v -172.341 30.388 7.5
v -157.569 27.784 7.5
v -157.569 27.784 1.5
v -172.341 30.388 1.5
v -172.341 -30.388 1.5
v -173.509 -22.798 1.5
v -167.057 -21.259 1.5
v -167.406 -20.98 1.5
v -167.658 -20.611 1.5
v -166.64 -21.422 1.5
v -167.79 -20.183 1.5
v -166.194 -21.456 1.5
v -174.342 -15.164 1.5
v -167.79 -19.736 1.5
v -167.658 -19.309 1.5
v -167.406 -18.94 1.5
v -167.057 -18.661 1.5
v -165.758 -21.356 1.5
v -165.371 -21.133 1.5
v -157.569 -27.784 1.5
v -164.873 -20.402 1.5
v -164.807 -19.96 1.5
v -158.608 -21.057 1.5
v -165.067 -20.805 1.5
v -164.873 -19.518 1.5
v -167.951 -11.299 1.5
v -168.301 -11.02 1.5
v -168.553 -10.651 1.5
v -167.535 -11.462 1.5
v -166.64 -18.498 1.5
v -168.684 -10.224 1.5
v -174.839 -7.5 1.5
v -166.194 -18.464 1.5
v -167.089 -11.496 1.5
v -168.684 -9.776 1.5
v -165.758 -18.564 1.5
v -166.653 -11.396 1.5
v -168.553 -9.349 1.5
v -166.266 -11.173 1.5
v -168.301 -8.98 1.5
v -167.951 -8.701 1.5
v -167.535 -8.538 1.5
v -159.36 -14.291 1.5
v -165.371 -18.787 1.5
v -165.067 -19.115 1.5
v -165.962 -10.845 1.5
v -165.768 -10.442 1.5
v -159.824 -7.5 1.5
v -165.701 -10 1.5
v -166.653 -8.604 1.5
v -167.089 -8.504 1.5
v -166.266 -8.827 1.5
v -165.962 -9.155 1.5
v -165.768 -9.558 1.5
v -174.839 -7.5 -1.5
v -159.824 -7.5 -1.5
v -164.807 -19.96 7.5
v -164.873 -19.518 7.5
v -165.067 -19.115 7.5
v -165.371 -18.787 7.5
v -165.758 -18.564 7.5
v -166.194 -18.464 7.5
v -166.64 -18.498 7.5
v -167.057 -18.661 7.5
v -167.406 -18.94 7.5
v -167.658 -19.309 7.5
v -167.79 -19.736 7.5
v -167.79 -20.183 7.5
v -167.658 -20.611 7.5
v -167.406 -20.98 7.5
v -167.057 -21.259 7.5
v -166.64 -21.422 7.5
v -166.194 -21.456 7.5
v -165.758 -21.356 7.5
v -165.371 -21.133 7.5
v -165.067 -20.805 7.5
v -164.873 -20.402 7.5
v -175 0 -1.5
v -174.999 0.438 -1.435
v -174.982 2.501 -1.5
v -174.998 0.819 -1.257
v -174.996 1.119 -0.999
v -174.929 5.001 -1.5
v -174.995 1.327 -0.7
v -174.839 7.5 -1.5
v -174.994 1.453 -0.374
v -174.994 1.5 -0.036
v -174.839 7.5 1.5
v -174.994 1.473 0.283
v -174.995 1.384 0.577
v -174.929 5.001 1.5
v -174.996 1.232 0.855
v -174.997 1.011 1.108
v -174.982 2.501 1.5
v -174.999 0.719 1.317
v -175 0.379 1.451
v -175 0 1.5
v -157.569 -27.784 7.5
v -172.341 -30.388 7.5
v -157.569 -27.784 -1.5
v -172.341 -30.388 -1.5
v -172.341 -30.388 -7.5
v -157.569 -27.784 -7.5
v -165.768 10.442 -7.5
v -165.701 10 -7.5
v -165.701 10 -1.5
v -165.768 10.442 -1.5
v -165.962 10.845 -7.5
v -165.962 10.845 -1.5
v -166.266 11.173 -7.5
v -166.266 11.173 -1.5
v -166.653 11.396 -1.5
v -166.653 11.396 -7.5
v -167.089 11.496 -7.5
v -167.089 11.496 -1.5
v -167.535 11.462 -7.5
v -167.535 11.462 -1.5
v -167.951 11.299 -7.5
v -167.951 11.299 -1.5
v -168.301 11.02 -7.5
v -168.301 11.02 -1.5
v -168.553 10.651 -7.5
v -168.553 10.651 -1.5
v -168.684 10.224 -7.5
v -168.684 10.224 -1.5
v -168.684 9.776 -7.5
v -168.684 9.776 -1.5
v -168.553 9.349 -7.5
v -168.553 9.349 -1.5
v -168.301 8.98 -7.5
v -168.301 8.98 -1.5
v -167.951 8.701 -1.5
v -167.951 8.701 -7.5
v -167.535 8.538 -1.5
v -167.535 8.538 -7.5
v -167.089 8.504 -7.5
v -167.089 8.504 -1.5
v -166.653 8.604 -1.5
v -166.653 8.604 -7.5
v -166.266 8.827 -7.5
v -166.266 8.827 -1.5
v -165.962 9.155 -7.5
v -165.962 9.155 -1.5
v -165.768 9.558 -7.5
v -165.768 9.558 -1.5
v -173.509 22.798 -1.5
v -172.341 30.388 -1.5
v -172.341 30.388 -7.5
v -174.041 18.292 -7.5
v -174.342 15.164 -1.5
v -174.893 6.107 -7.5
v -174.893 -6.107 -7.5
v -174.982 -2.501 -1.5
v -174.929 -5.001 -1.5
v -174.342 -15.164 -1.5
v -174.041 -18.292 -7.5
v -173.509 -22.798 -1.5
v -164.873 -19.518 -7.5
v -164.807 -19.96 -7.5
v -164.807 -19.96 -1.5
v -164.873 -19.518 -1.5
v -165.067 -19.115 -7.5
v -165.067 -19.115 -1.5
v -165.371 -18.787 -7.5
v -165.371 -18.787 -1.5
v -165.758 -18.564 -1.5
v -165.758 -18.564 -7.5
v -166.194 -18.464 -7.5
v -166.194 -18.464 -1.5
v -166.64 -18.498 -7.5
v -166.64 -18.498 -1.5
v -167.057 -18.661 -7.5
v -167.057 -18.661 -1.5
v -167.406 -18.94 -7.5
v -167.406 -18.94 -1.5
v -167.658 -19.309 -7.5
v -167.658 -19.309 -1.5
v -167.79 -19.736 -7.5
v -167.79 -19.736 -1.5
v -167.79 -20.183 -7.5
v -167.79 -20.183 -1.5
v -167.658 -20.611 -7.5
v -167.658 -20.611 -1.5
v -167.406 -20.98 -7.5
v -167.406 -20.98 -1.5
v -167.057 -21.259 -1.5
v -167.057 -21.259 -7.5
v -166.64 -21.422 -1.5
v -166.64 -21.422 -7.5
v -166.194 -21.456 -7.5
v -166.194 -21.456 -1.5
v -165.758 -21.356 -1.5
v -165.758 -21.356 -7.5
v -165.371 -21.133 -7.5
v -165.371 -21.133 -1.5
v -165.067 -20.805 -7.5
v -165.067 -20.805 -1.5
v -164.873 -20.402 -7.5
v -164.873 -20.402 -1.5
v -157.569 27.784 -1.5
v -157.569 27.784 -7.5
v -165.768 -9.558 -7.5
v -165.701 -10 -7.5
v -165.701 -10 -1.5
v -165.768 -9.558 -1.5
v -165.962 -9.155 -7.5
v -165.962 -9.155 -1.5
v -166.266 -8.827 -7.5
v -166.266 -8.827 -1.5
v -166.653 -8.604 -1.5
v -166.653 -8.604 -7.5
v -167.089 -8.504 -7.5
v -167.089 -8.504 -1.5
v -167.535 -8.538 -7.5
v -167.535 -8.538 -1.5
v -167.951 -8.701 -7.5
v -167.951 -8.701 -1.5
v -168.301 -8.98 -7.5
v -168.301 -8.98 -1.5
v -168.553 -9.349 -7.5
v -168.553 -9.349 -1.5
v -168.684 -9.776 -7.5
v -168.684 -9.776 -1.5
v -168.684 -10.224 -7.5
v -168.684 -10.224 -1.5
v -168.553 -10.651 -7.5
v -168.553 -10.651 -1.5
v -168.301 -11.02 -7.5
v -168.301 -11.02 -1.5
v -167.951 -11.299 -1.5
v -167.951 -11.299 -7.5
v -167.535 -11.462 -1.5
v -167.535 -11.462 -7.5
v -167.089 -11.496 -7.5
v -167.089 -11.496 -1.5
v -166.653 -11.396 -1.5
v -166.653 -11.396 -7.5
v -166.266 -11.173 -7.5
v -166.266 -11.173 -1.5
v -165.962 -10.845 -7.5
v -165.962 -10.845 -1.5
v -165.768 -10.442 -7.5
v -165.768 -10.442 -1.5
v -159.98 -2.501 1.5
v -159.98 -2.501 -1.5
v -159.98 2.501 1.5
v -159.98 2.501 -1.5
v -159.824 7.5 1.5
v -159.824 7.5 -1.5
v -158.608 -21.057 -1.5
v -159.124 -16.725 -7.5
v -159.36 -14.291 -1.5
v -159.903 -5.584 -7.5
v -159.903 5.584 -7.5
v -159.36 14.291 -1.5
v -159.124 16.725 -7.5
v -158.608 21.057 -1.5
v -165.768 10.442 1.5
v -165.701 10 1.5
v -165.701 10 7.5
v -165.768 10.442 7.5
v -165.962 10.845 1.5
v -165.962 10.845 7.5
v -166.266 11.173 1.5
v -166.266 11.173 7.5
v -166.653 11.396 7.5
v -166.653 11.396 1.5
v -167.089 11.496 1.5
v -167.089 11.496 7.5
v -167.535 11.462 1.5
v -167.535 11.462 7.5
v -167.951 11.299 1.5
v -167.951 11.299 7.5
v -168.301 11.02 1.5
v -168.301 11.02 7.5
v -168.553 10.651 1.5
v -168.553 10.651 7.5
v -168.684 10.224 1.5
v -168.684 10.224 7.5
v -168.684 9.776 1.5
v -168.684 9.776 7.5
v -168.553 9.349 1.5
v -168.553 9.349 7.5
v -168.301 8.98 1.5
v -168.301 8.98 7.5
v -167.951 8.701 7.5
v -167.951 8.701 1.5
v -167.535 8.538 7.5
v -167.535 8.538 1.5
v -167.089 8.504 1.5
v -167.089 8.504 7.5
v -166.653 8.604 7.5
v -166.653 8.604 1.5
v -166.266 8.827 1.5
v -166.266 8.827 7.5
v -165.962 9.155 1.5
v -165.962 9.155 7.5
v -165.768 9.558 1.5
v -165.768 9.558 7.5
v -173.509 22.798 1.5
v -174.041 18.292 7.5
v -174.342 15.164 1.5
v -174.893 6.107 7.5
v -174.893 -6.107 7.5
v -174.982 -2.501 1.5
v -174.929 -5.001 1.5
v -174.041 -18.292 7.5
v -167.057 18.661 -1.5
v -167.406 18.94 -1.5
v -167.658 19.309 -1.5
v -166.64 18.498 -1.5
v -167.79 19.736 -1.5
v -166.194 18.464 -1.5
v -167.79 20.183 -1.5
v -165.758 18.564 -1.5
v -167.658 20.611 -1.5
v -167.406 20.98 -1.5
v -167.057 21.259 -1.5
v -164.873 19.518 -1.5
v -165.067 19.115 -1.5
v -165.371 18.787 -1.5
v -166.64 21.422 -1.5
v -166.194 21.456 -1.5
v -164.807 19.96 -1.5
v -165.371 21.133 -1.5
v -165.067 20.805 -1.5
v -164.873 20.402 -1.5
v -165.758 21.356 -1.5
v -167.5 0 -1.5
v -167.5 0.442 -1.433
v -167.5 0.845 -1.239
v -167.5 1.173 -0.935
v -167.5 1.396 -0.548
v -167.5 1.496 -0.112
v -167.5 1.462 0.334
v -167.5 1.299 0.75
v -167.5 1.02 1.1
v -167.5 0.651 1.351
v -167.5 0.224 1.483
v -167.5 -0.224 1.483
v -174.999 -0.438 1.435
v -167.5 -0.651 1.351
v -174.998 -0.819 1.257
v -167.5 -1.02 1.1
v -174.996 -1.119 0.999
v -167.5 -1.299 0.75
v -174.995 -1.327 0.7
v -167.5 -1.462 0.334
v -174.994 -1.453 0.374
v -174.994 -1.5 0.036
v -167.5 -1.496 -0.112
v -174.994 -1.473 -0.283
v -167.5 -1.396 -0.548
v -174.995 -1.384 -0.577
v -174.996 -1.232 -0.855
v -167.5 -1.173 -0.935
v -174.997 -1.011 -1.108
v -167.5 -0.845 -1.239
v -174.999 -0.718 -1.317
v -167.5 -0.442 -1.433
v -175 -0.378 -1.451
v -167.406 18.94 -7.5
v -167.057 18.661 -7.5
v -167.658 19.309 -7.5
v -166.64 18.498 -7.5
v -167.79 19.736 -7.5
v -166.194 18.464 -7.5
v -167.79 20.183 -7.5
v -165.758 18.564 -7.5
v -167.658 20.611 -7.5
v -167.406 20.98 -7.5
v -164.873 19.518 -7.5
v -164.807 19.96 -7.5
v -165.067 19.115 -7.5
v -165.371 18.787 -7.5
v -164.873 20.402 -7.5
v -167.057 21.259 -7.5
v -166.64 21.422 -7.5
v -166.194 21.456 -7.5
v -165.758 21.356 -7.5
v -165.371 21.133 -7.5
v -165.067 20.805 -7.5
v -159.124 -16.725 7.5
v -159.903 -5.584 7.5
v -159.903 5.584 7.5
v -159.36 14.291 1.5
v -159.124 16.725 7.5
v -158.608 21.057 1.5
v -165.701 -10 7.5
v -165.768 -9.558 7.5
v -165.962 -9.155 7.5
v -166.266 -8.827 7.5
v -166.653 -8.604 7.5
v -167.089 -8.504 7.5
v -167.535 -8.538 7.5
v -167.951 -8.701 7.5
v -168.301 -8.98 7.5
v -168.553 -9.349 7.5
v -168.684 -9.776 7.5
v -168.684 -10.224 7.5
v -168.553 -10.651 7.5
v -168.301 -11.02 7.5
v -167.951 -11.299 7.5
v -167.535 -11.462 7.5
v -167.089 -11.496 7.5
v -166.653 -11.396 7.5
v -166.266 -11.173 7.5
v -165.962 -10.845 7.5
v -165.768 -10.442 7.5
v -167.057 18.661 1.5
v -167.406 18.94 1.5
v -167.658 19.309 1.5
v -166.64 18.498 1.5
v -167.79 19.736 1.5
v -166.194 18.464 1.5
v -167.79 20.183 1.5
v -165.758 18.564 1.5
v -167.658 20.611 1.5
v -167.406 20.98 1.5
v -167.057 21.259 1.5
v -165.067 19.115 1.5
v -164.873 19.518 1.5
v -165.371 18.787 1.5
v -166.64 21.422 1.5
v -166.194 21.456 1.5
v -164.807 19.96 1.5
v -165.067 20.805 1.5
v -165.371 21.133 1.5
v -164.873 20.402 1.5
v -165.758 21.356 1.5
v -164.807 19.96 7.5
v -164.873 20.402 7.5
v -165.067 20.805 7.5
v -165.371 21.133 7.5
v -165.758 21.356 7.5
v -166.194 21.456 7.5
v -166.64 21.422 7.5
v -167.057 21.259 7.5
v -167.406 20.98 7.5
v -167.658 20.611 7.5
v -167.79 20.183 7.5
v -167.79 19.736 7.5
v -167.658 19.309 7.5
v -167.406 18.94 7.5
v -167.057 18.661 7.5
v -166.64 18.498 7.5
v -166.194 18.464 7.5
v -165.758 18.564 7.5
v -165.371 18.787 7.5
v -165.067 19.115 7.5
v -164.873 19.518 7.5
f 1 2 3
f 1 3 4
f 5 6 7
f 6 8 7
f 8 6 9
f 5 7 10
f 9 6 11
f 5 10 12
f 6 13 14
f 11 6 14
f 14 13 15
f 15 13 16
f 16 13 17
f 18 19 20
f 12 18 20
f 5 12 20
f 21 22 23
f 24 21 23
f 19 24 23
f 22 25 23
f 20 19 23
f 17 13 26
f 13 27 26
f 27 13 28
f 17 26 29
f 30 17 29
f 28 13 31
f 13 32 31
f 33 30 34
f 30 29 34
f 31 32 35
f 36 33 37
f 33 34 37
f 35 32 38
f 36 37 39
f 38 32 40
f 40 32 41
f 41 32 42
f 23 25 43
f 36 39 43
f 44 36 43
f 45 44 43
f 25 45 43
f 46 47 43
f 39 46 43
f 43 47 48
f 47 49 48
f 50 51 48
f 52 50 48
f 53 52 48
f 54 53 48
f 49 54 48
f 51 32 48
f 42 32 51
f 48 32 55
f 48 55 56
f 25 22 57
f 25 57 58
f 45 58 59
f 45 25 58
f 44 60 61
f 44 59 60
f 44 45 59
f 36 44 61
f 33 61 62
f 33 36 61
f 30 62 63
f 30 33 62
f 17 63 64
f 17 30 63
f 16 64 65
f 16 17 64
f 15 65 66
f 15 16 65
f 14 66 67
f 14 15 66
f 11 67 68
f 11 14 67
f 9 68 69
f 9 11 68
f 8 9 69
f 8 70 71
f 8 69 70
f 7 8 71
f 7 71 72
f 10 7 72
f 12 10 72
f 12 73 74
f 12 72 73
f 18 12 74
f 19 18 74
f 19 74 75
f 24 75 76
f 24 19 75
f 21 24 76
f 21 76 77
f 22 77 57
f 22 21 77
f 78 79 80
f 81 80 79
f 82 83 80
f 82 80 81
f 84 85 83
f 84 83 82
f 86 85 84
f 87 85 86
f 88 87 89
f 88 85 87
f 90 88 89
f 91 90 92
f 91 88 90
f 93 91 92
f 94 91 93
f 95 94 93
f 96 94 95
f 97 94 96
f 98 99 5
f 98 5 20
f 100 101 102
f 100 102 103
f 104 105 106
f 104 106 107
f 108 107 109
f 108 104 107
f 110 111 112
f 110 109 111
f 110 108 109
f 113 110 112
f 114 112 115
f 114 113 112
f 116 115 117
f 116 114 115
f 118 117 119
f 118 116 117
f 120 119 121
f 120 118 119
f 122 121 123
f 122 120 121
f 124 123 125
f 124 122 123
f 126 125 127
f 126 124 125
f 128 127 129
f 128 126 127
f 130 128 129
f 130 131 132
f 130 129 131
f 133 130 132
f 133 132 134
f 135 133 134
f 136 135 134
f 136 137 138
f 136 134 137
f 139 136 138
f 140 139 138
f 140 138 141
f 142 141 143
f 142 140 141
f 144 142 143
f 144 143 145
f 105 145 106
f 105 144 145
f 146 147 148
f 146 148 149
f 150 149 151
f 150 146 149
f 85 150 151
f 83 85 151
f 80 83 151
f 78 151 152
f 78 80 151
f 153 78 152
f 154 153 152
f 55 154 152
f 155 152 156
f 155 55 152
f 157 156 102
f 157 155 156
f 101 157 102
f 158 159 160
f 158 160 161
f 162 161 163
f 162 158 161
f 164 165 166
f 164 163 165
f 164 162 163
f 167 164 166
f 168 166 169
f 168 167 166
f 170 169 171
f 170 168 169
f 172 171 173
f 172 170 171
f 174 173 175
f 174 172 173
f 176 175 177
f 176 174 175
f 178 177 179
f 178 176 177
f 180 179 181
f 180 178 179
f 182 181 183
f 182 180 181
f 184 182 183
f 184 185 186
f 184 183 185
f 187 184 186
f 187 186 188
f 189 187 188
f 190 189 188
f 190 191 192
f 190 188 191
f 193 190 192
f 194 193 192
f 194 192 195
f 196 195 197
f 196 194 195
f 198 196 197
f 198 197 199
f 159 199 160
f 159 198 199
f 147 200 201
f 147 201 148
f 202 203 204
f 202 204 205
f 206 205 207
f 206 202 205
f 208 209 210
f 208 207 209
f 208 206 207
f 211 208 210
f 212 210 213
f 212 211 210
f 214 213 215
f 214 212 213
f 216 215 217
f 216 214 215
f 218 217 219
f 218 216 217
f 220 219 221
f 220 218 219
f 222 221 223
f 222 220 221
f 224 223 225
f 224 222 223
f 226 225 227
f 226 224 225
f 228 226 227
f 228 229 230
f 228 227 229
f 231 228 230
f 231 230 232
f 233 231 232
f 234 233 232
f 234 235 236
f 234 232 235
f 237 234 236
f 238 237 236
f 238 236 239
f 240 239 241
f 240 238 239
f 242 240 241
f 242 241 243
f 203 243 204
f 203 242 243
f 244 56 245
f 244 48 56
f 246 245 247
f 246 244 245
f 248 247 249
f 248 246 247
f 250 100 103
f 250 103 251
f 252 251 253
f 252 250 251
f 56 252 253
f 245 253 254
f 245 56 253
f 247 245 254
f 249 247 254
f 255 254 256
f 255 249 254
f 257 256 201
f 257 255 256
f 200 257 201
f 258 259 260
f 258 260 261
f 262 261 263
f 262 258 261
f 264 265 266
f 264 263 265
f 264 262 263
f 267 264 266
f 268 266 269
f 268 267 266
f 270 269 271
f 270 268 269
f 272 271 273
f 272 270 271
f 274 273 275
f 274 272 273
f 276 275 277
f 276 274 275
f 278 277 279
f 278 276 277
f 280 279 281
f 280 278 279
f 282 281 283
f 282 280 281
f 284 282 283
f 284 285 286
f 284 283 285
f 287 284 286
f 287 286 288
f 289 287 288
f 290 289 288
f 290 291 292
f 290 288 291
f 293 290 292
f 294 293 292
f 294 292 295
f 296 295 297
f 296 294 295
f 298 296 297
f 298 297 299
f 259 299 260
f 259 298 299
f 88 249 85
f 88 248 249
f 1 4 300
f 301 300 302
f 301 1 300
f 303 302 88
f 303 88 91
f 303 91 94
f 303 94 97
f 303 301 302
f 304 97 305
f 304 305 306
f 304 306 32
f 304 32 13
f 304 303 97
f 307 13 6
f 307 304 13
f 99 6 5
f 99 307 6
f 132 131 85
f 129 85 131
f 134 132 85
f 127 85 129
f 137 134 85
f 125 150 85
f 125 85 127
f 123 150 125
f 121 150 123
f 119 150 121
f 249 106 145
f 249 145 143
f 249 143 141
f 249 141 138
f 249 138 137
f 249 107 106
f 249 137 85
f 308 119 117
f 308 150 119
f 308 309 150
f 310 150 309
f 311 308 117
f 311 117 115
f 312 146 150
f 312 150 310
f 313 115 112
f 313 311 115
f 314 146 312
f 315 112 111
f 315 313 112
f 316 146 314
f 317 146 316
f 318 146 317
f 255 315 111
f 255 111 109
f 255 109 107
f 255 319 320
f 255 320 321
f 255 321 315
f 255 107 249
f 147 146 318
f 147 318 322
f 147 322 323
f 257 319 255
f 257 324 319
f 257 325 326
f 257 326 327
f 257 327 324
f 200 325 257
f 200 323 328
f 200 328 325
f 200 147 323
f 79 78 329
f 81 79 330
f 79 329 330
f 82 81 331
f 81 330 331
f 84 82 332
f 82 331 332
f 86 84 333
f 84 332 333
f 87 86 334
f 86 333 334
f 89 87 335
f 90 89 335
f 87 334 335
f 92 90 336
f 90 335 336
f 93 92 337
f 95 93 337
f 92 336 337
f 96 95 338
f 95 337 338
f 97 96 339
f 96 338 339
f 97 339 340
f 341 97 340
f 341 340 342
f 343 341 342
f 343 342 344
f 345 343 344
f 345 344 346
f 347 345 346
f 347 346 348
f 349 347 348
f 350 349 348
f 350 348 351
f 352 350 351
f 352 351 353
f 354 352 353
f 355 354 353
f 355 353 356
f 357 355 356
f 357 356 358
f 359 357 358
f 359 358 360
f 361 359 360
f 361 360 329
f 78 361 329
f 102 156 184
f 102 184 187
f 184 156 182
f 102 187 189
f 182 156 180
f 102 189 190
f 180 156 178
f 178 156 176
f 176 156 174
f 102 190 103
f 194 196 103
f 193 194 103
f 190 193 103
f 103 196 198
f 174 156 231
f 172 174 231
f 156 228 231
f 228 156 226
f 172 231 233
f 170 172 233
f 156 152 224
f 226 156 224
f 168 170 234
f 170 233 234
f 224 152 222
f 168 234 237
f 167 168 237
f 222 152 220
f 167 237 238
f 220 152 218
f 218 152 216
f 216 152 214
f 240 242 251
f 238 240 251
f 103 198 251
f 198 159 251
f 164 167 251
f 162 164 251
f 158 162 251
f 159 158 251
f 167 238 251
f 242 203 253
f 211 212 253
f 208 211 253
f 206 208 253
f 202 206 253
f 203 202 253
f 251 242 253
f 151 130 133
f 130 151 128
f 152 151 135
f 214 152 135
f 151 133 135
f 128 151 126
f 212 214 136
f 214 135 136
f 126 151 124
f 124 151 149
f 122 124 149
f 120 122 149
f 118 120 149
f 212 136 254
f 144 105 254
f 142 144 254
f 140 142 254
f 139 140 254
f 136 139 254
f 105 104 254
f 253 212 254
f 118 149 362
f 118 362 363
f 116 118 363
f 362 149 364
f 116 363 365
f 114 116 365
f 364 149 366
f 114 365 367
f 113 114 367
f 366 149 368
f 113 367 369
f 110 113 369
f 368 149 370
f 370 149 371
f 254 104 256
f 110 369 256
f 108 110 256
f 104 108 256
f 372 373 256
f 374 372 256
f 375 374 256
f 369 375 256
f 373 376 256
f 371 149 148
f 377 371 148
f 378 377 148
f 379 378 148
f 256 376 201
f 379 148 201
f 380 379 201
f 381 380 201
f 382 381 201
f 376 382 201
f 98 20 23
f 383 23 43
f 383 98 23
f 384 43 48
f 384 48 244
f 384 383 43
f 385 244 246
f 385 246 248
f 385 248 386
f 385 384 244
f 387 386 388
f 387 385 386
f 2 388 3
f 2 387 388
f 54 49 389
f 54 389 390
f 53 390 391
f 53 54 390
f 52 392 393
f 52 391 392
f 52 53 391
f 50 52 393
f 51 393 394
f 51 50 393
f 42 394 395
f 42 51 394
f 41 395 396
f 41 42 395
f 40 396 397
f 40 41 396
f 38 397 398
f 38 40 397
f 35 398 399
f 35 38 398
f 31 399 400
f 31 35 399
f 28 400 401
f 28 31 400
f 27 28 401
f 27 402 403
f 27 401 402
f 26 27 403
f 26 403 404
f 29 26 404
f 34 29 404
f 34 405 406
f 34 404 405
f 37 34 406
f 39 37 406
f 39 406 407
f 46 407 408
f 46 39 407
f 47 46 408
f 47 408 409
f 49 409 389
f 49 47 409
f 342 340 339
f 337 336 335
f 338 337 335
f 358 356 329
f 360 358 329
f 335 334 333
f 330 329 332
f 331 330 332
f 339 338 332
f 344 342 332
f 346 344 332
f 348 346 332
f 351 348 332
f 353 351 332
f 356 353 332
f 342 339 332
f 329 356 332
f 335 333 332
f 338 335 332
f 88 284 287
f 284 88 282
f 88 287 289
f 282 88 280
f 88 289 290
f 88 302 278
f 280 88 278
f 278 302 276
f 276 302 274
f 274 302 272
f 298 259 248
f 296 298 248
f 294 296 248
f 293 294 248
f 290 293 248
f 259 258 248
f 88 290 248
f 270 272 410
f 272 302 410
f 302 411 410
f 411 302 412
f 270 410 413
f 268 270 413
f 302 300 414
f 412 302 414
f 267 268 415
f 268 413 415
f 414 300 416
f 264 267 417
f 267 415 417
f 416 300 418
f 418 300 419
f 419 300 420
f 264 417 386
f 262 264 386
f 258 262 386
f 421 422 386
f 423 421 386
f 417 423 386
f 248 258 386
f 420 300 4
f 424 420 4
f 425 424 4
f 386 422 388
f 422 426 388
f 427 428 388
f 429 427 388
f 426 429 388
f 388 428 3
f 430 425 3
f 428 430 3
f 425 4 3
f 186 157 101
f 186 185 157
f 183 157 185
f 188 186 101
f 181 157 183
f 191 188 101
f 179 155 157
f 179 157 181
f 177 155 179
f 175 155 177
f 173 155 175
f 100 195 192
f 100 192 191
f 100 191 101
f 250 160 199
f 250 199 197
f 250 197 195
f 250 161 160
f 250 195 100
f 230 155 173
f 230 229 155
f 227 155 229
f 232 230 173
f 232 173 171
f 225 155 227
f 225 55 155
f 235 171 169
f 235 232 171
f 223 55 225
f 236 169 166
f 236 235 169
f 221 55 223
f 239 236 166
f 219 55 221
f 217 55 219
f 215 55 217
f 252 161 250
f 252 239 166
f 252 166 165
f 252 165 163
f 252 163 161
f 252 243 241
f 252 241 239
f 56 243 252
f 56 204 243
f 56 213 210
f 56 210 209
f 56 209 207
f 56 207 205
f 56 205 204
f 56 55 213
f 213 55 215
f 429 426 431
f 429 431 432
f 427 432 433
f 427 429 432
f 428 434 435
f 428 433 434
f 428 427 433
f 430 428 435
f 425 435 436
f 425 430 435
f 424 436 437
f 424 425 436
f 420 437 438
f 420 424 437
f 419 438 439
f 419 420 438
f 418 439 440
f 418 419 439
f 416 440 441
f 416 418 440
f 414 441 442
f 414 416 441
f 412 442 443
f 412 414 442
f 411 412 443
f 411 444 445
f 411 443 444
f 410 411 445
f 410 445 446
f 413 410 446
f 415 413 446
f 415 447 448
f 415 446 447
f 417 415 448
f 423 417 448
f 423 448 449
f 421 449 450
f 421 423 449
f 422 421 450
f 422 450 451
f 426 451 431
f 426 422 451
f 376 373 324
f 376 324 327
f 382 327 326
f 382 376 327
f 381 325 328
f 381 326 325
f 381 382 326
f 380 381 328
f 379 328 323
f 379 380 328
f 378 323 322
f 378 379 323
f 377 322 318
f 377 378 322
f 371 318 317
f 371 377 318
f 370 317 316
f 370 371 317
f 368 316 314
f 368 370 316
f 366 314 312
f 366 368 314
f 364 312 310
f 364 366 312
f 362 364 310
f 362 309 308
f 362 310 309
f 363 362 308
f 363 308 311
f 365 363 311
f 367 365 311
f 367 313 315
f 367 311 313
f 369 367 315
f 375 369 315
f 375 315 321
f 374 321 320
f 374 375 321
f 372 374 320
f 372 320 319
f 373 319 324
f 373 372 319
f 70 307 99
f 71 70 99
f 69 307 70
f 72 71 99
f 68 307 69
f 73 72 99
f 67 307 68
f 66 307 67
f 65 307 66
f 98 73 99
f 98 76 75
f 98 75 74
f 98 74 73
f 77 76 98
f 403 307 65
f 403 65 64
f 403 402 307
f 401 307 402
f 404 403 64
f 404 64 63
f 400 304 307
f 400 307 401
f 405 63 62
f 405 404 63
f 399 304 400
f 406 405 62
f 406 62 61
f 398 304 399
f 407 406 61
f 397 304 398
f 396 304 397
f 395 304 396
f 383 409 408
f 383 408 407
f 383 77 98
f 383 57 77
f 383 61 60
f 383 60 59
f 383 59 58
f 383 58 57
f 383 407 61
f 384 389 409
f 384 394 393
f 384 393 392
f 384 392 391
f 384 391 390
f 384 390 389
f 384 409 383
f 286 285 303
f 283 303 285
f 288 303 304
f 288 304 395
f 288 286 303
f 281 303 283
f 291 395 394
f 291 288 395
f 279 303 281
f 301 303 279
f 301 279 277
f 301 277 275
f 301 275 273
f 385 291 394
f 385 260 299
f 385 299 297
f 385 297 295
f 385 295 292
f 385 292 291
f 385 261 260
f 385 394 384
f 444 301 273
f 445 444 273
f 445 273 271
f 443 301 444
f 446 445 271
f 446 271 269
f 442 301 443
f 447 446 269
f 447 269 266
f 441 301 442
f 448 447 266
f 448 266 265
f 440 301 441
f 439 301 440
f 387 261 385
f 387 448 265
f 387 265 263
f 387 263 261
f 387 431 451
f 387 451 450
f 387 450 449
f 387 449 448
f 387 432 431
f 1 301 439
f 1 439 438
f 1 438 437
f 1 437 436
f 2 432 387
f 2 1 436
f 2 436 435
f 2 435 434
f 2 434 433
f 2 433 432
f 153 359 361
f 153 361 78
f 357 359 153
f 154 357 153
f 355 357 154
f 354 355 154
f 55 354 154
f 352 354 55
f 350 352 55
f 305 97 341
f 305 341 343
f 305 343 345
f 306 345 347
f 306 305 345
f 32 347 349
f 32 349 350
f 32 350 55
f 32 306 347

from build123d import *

# Parameters (mm, degrees)
BOSS_EXTRUDE3_DEPTH     = 7.5
CUT_EXTRUDE4_DEPTH      = 1.5
BOSS_EXTRUDE5_DEPTH     = 1.5
SHAFT_HOLE_REACH        = 34.838
SHAFT_HOLE_END_RADIUS   = 175
SKETCH7_R               = 1.5
CUT_EXTRUDE6_DEPTH      = 178.777126726
CUT_EXTRUDE6_DEPTH_BACK = 178.777126726
SKETCH8_R               = 1.5


with BuildPart() as part:
    # Sketch1 → Boss-Extrude3 (new, symmetric)
    with BuildSketch(Plane.XY):
        with BuildLine():
            ThreePointArc((-157.569240482, -27.783708427), (-160, 0), (-157.569240482, 27.783708427))
            Line((-157.569240482, 27.783708427), (-172.341356777, 30.388431092))
            ThreePointArc((-172.341356777, 30.388431092), (-175, 0), (-172.341356777, -30.388431092))
            Line((-172.341356777, -30.388431092), (-157.569240482, -27.783708427))
        make_face()
    extrude(amount=BOSS_EXTRUDE3_DEPTH, both=True)

    # Sketch1<6> → Cut-Extrude4 (cut, symmetric)
    with BuildSketch(Plane.XY):
        with BuildLine():
            Line((-157.569240482, 27.783708427), (-172.341356777, 30.388431092))
            ThreePointArc((-172.341356777, 30.388431092), (-175, 0), (-172.341356777, -30.388431092))
            Line((-172.341356777, -30.388431092), (-157.569240482, -27.783708427))
            ThreePointArc((-157.569240482, -27.783708427), (-160, 0), (-157.569240482, 27.783708427))
        make_face()
    extrude(amount=CUT_EXTRUDE4_DEPTH, both=True, mode=Mode.SUBTRACT)


with BuildPart() as cut_extrude4_piece_1:
    # of the separate pieces the step leaves, piece 1, a body of its own (cut_extrude4_pieces)
    add(part.part.solids().sort_by_distance((-157.569240482, -27.783708427, -1.5))[0])



with BuildPart() as cut_extrude4_piece_2:
    # of the separate pieces the step leaves, piece 2, a body of its own (cut_extrude4_pieces)
    add(part.part.solids().sort_by_distance((-157.569240482, -27.783708427, 7.5))[0])


with BuildPart() as cut_extrude4_piece_1_1:
    add(cut_extrude4_piece_1.part)

    add(cut_extrude4_piece_2.part)  # Boss-Extrude5 merges Cut-Extrude4 piece 2
    # Sketch6 → Boss-Extrude5 (add, symmetric)
    with BuildSketch(Plane.XY):
        with BuildLine():
            Line((-159.824122084, 7.5), (-174.839211849, 7.5))
            ThreePointArc((-174.839211849, 7.5), (-175, 0), (-174.839211849, -7.5))
            Line((-174.839211849, -7.5), (-159.824122084, -7.5))
            ThreePointArc((-159.824122084, -7.5), (-160, 0), (-159.824122084, 7.5))
        make_face()
    extrude(amount=BOSS_EXTRUDE5_DEPTH, both=True)

    # shaft hole: up to this cylinder (the profile starts inside it)
    shaft_hole_end = Plane(origin=(0, 0, 0), z_dir=(0, 0, -1)) * Cylinder(SHAFT_HOLE_END_RADIUS, 420.676, mode=Mode.PRIVATE)
    # Sketch7 → shaft hole (cut, up to the surface)
    with BuildSketch(Plane(origin=(-167.5, 0, 0), x_dir=(0, 0, -1), z_dir=(1, 0, 0)), mode=Mode.PRIVATE) as shaft_hole_sk1:
        Circle(SKETCH7_R)
    shaft_hole_tool1 = extrude(shaft_hole_sk1.sketch, amount=-SHAFT_HOLE_REACH, mode=Mode.PRIVATE) & shaft_hole_end
    add(shaft_hole_tool1.solids().sort_by_distance((-167.5, 0, 0))[0], mode=Mode.SUBTRACT)

    # Sketch8 → Cut-Extrude6 (cut, two sides: drawn at the far end of the back side and taken through both)
    with BuildSketch(Plane.XY.offset(-CUT_EXTRUDE6_DEPTH_BACK)):
        with Locations((-166.306502189, 19.95989303)):
            Circle(SKETCH8_R)
        with Locations((-167.201226072, 10)):
            Circle(SKETCH8_R)
        with Locations((-167.201226072, -10)):
            Circle(SKETCH8_R)
        with Locations((-166.306502189, -19.95989303)):
            Circle(SKETCH8_R)
    extrude(amount=CUT_EXTRUDE6_DEPTH + CUT_EXTRUDE6_DEPTH_BACK, mode=Mode.SUBTRACT)


solid = cut_extrude4_piece_1_1.part
